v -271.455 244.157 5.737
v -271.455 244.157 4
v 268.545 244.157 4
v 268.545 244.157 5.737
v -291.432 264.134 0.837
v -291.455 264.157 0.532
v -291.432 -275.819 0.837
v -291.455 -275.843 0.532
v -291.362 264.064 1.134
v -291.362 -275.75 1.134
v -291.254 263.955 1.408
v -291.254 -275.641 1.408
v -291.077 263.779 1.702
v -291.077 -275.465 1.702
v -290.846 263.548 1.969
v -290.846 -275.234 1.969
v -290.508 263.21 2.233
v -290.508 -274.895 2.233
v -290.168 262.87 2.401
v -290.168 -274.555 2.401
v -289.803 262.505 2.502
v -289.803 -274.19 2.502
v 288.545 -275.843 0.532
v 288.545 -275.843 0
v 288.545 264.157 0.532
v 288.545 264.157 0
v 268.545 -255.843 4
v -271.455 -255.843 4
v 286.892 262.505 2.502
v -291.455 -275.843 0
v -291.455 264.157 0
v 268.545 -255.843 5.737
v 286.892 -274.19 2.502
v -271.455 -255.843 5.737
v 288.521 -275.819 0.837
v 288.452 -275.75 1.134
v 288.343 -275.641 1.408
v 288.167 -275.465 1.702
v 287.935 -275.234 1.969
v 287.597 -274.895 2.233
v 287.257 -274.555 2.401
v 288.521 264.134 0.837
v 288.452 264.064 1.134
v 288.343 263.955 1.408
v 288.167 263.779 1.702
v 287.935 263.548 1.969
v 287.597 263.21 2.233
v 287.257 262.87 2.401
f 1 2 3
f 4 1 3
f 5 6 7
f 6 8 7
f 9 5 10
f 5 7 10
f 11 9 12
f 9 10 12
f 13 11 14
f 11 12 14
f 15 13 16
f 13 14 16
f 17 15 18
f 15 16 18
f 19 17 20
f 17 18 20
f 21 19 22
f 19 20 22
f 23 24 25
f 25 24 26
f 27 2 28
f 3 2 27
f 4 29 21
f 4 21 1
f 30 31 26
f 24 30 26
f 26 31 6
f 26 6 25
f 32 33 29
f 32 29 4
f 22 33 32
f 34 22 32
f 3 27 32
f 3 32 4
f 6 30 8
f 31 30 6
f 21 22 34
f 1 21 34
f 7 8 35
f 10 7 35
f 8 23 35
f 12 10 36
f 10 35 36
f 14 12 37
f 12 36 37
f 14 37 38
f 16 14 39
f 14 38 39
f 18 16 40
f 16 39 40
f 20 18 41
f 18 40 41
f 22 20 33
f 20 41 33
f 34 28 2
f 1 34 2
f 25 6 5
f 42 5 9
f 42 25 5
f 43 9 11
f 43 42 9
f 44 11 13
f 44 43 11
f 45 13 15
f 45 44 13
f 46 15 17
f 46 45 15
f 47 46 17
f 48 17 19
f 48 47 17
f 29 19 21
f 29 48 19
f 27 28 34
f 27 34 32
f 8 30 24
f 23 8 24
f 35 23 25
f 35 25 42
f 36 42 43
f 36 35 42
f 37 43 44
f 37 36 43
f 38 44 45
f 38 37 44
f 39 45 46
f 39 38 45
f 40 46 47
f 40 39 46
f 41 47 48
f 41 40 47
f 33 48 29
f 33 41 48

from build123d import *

# Parameters (mm, degrees)
F0_W        = 580
F0_H        = 540
F1_DEPTH    = 7.5
F2_T        = -20
F3_T1_DEPTH = 695.9123277853
F3_T3_DEPTH = 735.9123277853
F4_R        = 2
F5_W        = 540
F5_H        = 500
F6_DEPTH    = 4


# Not quite as in the source:
# - a fillet or chamfer that OpenCascade refuses, or shapes differently, is made with other operations: its cross-section is extruded or revolved along the edge and cut away or added


with BuildPart() as f1:
    # F0 (on Top) → F1 (new body)
    with BuildSketch(Plane.XY):
        with Locations((-1.4553386718, -5.8427717585)):
            Rectangle(F0_W, F0_H)
    extrude(amount=F1_DEPTH)

    # F2
    f2_openings = [f1.faces().sort_by_distance(p)[0] for p in [
        (-1.455339, -5.842772, 7.5),
        (-1.455339, -5.842772, 0),
    ]]
    offset(amount=F2_T, openings=f2_openings)

    # F3: chamfer of 30 x 5.2898094213 on 4 edges, made by hand

    # F3_s2 → F3_t1 (cut)
    with BuildSketch(Plane.XZ.offset(-342.1133921341)):
        Polygon((-291.4553386718, 2.2101905787), (-261.4553386718, 7.5), (-291.4553386718, 7.5), align=None)
        Polygon((288.5446613282, 2.2101905787), (258.5446613282, 7.5), (288.5446613282, 7.5), align=None)
    extrude(amount=F3_T1_DEPTH, mode=Mode.SUBTRACT)

    # F3_s4 → F3_t3 (cut)
    with BuildSketch(Plane.YZ.offset(-369.4115025644)):
        Polygon((-275.8427717585, 2.2101905787), (-245.8427717585, 7.5), (-275.8427717585, 7.5), align=None)
        Polygon((264.1572282415, 2.2101905787), (234.1572282415, 7.5), (264.1572282415, 7.5), align=None)
    extrude(amount=F3_T3_DEPTH, mode=Mode.SUBTRACT)

    # F4
    f4_edges = [f1.edges().sort_by_distance(p)[0] for p in [
        (-291.455339, -5.842772, 2.210191),
        (-1.455339, -275.842772, 2.210191),
        (288.544661, -5.842772, 2.210191),
        (-1.455339, 264.157228, 2.210191),
    ]]
    fillet(f4_edges, radius=F4_R)

    # F5 (on Top) → F6 (join)
    with BuildSketch(Plane.XY):
        with Locations((-1.4553386718, -5.8427717585)):
            Rectangle(F5_W, F5_H)
    extrude(amount=F6_DEPTH)


solid = f1.part
